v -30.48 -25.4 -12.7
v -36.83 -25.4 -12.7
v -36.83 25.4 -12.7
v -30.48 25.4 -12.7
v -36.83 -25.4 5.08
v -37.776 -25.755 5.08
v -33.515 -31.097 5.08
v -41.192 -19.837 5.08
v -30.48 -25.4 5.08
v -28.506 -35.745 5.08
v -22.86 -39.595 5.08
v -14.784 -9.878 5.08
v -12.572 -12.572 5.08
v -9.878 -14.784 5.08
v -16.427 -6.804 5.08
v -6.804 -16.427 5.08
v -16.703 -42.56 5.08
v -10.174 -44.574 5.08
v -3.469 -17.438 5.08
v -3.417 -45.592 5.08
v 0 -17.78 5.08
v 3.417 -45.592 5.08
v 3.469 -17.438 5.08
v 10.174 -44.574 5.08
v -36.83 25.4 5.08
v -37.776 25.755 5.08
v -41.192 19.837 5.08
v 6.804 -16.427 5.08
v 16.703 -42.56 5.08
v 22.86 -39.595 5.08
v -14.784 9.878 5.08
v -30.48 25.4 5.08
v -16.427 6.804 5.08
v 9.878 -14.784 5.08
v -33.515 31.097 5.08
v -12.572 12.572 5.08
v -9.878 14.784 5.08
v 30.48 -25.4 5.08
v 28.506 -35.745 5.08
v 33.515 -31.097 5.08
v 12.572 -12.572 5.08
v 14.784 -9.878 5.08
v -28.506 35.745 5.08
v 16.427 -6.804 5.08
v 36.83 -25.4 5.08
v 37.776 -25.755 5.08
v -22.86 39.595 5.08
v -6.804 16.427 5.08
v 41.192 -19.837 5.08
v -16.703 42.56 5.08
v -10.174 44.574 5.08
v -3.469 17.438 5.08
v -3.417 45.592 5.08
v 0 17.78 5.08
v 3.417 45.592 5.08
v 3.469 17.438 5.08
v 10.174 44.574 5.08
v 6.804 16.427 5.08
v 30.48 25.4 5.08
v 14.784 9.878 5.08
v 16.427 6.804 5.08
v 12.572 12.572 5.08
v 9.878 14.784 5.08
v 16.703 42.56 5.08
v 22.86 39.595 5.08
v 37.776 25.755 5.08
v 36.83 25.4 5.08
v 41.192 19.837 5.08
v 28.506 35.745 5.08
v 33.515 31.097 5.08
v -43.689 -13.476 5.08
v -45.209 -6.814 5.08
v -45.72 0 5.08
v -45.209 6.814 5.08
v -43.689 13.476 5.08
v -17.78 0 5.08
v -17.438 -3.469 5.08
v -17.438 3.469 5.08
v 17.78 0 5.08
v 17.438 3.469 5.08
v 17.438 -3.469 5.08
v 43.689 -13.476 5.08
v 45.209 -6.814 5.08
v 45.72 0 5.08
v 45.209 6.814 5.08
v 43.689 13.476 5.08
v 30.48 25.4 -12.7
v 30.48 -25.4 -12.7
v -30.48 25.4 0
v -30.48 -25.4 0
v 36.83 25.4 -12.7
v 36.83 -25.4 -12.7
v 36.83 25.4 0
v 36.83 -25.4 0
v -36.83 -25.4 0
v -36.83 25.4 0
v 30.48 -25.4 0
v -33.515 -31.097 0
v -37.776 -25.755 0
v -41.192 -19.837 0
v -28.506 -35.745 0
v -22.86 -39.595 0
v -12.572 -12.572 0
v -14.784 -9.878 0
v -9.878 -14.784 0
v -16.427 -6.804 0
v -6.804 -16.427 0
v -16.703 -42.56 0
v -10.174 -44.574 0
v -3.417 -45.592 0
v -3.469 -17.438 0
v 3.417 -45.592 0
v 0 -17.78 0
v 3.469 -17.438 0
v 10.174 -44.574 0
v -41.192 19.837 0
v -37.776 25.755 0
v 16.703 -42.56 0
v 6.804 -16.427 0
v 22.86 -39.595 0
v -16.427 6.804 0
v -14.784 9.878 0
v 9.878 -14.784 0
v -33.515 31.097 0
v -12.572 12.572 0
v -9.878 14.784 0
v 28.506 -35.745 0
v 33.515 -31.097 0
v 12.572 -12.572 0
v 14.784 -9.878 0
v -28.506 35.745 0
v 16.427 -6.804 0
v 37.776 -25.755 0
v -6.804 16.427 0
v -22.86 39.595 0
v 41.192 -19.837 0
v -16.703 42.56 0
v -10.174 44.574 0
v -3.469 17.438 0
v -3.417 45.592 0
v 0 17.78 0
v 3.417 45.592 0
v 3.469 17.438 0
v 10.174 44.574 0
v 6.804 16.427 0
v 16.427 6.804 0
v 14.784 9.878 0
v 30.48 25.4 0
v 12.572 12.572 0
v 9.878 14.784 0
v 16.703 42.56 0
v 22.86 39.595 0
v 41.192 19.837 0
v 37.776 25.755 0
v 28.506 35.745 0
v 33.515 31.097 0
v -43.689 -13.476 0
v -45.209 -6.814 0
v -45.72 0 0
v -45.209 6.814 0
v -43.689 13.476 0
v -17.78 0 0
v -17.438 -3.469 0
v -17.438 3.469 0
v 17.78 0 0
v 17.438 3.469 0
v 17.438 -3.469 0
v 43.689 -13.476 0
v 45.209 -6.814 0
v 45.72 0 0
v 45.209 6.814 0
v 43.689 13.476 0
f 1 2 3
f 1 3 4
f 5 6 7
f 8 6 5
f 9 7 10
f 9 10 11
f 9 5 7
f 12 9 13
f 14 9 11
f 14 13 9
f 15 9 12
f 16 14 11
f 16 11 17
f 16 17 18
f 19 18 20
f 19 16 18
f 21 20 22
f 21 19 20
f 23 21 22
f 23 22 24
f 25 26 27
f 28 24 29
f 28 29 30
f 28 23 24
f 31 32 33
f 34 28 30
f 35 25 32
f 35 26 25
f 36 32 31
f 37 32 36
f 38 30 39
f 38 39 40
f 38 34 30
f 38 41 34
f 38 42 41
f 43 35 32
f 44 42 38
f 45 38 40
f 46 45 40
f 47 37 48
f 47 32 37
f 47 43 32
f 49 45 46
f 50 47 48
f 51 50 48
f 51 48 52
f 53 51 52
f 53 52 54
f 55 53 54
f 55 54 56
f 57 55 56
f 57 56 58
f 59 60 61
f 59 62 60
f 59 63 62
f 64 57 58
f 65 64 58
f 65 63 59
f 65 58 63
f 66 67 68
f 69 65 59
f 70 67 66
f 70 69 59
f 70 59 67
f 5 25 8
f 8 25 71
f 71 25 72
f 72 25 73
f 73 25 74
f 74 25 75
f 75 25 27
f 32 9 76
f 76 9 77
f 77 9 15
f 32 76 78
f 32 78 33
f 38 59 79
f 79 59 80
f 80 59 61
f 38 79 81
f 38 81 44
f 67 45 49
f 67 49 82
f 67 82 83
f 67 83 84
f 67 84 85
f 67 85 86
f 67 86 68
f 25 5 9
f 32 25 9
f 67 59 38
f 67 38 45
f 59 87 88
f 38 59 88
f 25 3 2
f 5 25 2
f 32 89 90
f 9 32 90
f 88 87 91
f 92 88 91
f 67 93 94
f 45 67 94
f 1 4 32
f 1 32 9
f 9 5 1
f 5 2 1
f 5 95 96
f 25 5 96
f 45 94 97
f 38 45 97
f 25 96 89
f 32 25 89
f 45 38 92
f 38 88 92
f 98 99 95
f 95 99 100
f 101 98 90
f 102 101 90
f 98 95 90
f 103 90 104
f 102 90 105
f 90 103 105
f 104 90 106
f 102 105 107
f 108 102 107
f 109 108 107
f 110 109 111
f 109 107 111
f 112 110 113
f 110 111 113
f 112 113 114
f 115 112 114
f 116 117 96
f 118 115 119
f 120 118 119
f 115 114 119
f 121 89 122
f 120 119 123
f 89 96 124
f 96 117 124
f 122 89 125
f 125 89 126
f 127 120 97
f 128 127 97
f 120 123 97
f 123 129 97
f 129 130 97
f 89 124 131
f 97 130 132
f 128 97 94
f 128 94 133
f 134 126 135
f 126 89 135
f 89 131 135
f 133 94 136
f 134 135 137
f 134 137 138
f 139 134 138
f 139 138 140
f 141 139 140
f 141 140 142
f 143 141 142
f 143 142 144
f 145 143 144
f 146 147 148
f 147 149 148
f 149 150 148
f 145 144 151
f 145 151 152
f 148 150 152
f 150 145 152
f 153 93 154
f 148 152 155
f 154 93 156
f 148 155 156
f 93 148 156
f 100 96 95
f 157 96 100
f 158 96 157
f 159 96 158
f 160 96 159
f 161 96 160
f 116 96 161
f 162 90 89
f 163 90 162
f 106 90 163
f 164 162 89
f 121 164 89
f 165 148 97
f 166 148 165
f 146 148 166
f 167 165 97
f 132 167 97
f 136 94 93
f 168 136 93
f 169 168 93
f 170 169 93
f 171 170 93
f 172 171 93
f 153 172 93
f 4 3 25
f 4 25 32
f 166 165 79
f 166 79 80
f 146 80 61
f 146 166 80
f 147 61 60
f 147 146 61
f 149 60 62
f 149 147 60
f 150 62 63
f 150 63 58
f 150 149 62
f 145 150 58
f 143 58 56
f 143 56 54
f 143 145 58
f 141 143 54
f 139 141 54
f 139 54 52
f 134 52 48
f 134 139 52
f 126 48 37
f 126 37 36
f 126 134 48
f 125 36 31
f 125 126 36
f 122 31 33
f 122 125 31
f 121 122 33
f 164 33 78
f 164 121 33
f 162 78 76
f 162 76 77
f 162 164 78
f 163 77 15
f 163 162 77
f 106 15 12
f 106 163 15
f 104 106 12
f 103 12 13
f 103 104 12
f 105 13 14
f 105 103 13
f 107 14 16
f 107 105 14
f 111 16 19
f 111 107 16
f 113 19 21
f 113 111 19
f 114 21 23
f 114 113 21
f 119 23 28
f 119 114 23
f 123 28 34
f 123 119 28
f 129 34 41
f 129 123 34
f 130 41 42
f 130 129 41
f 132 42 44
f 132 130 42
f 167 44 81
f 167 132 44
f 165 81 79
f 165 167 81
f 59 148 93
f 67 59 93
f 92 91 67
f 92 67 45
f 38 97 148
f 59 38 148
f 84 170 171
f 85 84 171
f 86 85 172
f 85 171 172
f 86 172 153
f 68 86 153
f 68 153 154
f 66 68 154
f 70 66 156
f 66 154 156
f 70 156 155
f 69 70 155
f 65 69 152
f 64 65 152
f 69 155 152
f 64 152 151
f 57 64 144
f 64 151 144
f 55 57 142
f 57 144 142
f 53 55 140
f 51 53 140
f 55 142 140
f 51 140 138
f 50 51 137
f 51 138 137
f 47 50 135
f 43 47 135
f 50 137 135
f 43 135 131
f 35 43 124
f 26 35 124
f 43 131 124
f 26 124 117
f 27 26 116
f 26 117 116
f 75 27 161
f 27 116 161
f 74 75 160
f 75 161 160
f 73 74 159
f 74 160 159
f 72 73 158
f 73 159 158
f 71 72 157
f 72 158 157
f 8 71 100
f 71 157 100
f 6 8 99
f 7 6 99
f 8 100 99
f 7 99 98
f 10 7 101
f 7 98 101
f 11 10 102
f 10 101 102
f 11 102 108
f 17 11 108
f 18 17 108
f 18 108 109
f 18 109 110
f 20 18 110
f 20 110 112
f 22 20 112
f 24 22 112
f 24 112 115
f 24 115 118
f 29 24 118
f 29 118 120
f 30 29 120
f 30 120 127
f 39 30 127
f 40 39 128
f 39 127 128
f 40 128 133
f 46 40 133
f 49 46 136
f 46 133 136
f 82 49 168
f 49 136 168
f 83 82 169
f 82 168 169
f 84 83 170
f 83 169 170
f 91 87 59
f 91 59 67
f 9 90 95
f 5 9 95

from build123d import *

# Parameters (mm, degrees)
F0_R          = 45.72
F0_R_2        = 17.78
F1_DEPTH      = 5.08
F2_W          = 6.35
F2_H          = 50.8
F3_DEPTH      = 12.7
F3_DEPTH_BACK = 5.08


with BuildPart() as f1:
    # F0 (on Top) → F1 (new body)
    with BuildSketch(Plane.XY):
        Circle(F0_R)
        Polygon((-36.83, -25.4), (-36.83, 0), (-36.83, 25.4), (-30.48, 25.4), (-30.48, 0), (-30.48, -25.4), align=None, mode=Mode.SUBTRACT)
        Circle(F0_R_2, mode=Mode.SUBTRACT)
        Polygon((30.48, -25.4), (30.48, 0), (30.48, 25.4), (36.83, 25.4), (36.83, 0), (36.83, -25.4), align=None, mode=Mode.SUBTRACT)
    extrude(amount=F1_DEPTH)


with BuildPart() as f3:
    # F2 (on face) → F3 (new body, two sides)
    with BuildSketch(Plane(origin=(0, 0, 0), x_dir=(1, 0, 0), z_dir=(0, 0, -1))) as f3_sk:
        with Locations((33.655, 0)):
            Rectangle(F2_W, F2_H)
    extrude(amount=F3_DEPTH)
    extrude(f3_sk.sketch, amount=-F3_DEPTH_BACK)


with BuildPart() as f3b:
    # F2 (on face) → F3, piece 2 (new body, two sides)
    with BuildSketch(Plane(origin=(0, 0, 0), x_dir=(1, 0, 0), z_dir=(0, 0, -1))) as f3_2_sk:
        with Locations((-33.655, 0)):
            Rectangle(F2_W, F2_H)
    extrude(amount=F3_DEPTH)
    extrude(f3_2_sk.sketch, amount=-F3_DEPTH_BACK)


solid = Compound([f1.part, f3.part, f3b.part])
